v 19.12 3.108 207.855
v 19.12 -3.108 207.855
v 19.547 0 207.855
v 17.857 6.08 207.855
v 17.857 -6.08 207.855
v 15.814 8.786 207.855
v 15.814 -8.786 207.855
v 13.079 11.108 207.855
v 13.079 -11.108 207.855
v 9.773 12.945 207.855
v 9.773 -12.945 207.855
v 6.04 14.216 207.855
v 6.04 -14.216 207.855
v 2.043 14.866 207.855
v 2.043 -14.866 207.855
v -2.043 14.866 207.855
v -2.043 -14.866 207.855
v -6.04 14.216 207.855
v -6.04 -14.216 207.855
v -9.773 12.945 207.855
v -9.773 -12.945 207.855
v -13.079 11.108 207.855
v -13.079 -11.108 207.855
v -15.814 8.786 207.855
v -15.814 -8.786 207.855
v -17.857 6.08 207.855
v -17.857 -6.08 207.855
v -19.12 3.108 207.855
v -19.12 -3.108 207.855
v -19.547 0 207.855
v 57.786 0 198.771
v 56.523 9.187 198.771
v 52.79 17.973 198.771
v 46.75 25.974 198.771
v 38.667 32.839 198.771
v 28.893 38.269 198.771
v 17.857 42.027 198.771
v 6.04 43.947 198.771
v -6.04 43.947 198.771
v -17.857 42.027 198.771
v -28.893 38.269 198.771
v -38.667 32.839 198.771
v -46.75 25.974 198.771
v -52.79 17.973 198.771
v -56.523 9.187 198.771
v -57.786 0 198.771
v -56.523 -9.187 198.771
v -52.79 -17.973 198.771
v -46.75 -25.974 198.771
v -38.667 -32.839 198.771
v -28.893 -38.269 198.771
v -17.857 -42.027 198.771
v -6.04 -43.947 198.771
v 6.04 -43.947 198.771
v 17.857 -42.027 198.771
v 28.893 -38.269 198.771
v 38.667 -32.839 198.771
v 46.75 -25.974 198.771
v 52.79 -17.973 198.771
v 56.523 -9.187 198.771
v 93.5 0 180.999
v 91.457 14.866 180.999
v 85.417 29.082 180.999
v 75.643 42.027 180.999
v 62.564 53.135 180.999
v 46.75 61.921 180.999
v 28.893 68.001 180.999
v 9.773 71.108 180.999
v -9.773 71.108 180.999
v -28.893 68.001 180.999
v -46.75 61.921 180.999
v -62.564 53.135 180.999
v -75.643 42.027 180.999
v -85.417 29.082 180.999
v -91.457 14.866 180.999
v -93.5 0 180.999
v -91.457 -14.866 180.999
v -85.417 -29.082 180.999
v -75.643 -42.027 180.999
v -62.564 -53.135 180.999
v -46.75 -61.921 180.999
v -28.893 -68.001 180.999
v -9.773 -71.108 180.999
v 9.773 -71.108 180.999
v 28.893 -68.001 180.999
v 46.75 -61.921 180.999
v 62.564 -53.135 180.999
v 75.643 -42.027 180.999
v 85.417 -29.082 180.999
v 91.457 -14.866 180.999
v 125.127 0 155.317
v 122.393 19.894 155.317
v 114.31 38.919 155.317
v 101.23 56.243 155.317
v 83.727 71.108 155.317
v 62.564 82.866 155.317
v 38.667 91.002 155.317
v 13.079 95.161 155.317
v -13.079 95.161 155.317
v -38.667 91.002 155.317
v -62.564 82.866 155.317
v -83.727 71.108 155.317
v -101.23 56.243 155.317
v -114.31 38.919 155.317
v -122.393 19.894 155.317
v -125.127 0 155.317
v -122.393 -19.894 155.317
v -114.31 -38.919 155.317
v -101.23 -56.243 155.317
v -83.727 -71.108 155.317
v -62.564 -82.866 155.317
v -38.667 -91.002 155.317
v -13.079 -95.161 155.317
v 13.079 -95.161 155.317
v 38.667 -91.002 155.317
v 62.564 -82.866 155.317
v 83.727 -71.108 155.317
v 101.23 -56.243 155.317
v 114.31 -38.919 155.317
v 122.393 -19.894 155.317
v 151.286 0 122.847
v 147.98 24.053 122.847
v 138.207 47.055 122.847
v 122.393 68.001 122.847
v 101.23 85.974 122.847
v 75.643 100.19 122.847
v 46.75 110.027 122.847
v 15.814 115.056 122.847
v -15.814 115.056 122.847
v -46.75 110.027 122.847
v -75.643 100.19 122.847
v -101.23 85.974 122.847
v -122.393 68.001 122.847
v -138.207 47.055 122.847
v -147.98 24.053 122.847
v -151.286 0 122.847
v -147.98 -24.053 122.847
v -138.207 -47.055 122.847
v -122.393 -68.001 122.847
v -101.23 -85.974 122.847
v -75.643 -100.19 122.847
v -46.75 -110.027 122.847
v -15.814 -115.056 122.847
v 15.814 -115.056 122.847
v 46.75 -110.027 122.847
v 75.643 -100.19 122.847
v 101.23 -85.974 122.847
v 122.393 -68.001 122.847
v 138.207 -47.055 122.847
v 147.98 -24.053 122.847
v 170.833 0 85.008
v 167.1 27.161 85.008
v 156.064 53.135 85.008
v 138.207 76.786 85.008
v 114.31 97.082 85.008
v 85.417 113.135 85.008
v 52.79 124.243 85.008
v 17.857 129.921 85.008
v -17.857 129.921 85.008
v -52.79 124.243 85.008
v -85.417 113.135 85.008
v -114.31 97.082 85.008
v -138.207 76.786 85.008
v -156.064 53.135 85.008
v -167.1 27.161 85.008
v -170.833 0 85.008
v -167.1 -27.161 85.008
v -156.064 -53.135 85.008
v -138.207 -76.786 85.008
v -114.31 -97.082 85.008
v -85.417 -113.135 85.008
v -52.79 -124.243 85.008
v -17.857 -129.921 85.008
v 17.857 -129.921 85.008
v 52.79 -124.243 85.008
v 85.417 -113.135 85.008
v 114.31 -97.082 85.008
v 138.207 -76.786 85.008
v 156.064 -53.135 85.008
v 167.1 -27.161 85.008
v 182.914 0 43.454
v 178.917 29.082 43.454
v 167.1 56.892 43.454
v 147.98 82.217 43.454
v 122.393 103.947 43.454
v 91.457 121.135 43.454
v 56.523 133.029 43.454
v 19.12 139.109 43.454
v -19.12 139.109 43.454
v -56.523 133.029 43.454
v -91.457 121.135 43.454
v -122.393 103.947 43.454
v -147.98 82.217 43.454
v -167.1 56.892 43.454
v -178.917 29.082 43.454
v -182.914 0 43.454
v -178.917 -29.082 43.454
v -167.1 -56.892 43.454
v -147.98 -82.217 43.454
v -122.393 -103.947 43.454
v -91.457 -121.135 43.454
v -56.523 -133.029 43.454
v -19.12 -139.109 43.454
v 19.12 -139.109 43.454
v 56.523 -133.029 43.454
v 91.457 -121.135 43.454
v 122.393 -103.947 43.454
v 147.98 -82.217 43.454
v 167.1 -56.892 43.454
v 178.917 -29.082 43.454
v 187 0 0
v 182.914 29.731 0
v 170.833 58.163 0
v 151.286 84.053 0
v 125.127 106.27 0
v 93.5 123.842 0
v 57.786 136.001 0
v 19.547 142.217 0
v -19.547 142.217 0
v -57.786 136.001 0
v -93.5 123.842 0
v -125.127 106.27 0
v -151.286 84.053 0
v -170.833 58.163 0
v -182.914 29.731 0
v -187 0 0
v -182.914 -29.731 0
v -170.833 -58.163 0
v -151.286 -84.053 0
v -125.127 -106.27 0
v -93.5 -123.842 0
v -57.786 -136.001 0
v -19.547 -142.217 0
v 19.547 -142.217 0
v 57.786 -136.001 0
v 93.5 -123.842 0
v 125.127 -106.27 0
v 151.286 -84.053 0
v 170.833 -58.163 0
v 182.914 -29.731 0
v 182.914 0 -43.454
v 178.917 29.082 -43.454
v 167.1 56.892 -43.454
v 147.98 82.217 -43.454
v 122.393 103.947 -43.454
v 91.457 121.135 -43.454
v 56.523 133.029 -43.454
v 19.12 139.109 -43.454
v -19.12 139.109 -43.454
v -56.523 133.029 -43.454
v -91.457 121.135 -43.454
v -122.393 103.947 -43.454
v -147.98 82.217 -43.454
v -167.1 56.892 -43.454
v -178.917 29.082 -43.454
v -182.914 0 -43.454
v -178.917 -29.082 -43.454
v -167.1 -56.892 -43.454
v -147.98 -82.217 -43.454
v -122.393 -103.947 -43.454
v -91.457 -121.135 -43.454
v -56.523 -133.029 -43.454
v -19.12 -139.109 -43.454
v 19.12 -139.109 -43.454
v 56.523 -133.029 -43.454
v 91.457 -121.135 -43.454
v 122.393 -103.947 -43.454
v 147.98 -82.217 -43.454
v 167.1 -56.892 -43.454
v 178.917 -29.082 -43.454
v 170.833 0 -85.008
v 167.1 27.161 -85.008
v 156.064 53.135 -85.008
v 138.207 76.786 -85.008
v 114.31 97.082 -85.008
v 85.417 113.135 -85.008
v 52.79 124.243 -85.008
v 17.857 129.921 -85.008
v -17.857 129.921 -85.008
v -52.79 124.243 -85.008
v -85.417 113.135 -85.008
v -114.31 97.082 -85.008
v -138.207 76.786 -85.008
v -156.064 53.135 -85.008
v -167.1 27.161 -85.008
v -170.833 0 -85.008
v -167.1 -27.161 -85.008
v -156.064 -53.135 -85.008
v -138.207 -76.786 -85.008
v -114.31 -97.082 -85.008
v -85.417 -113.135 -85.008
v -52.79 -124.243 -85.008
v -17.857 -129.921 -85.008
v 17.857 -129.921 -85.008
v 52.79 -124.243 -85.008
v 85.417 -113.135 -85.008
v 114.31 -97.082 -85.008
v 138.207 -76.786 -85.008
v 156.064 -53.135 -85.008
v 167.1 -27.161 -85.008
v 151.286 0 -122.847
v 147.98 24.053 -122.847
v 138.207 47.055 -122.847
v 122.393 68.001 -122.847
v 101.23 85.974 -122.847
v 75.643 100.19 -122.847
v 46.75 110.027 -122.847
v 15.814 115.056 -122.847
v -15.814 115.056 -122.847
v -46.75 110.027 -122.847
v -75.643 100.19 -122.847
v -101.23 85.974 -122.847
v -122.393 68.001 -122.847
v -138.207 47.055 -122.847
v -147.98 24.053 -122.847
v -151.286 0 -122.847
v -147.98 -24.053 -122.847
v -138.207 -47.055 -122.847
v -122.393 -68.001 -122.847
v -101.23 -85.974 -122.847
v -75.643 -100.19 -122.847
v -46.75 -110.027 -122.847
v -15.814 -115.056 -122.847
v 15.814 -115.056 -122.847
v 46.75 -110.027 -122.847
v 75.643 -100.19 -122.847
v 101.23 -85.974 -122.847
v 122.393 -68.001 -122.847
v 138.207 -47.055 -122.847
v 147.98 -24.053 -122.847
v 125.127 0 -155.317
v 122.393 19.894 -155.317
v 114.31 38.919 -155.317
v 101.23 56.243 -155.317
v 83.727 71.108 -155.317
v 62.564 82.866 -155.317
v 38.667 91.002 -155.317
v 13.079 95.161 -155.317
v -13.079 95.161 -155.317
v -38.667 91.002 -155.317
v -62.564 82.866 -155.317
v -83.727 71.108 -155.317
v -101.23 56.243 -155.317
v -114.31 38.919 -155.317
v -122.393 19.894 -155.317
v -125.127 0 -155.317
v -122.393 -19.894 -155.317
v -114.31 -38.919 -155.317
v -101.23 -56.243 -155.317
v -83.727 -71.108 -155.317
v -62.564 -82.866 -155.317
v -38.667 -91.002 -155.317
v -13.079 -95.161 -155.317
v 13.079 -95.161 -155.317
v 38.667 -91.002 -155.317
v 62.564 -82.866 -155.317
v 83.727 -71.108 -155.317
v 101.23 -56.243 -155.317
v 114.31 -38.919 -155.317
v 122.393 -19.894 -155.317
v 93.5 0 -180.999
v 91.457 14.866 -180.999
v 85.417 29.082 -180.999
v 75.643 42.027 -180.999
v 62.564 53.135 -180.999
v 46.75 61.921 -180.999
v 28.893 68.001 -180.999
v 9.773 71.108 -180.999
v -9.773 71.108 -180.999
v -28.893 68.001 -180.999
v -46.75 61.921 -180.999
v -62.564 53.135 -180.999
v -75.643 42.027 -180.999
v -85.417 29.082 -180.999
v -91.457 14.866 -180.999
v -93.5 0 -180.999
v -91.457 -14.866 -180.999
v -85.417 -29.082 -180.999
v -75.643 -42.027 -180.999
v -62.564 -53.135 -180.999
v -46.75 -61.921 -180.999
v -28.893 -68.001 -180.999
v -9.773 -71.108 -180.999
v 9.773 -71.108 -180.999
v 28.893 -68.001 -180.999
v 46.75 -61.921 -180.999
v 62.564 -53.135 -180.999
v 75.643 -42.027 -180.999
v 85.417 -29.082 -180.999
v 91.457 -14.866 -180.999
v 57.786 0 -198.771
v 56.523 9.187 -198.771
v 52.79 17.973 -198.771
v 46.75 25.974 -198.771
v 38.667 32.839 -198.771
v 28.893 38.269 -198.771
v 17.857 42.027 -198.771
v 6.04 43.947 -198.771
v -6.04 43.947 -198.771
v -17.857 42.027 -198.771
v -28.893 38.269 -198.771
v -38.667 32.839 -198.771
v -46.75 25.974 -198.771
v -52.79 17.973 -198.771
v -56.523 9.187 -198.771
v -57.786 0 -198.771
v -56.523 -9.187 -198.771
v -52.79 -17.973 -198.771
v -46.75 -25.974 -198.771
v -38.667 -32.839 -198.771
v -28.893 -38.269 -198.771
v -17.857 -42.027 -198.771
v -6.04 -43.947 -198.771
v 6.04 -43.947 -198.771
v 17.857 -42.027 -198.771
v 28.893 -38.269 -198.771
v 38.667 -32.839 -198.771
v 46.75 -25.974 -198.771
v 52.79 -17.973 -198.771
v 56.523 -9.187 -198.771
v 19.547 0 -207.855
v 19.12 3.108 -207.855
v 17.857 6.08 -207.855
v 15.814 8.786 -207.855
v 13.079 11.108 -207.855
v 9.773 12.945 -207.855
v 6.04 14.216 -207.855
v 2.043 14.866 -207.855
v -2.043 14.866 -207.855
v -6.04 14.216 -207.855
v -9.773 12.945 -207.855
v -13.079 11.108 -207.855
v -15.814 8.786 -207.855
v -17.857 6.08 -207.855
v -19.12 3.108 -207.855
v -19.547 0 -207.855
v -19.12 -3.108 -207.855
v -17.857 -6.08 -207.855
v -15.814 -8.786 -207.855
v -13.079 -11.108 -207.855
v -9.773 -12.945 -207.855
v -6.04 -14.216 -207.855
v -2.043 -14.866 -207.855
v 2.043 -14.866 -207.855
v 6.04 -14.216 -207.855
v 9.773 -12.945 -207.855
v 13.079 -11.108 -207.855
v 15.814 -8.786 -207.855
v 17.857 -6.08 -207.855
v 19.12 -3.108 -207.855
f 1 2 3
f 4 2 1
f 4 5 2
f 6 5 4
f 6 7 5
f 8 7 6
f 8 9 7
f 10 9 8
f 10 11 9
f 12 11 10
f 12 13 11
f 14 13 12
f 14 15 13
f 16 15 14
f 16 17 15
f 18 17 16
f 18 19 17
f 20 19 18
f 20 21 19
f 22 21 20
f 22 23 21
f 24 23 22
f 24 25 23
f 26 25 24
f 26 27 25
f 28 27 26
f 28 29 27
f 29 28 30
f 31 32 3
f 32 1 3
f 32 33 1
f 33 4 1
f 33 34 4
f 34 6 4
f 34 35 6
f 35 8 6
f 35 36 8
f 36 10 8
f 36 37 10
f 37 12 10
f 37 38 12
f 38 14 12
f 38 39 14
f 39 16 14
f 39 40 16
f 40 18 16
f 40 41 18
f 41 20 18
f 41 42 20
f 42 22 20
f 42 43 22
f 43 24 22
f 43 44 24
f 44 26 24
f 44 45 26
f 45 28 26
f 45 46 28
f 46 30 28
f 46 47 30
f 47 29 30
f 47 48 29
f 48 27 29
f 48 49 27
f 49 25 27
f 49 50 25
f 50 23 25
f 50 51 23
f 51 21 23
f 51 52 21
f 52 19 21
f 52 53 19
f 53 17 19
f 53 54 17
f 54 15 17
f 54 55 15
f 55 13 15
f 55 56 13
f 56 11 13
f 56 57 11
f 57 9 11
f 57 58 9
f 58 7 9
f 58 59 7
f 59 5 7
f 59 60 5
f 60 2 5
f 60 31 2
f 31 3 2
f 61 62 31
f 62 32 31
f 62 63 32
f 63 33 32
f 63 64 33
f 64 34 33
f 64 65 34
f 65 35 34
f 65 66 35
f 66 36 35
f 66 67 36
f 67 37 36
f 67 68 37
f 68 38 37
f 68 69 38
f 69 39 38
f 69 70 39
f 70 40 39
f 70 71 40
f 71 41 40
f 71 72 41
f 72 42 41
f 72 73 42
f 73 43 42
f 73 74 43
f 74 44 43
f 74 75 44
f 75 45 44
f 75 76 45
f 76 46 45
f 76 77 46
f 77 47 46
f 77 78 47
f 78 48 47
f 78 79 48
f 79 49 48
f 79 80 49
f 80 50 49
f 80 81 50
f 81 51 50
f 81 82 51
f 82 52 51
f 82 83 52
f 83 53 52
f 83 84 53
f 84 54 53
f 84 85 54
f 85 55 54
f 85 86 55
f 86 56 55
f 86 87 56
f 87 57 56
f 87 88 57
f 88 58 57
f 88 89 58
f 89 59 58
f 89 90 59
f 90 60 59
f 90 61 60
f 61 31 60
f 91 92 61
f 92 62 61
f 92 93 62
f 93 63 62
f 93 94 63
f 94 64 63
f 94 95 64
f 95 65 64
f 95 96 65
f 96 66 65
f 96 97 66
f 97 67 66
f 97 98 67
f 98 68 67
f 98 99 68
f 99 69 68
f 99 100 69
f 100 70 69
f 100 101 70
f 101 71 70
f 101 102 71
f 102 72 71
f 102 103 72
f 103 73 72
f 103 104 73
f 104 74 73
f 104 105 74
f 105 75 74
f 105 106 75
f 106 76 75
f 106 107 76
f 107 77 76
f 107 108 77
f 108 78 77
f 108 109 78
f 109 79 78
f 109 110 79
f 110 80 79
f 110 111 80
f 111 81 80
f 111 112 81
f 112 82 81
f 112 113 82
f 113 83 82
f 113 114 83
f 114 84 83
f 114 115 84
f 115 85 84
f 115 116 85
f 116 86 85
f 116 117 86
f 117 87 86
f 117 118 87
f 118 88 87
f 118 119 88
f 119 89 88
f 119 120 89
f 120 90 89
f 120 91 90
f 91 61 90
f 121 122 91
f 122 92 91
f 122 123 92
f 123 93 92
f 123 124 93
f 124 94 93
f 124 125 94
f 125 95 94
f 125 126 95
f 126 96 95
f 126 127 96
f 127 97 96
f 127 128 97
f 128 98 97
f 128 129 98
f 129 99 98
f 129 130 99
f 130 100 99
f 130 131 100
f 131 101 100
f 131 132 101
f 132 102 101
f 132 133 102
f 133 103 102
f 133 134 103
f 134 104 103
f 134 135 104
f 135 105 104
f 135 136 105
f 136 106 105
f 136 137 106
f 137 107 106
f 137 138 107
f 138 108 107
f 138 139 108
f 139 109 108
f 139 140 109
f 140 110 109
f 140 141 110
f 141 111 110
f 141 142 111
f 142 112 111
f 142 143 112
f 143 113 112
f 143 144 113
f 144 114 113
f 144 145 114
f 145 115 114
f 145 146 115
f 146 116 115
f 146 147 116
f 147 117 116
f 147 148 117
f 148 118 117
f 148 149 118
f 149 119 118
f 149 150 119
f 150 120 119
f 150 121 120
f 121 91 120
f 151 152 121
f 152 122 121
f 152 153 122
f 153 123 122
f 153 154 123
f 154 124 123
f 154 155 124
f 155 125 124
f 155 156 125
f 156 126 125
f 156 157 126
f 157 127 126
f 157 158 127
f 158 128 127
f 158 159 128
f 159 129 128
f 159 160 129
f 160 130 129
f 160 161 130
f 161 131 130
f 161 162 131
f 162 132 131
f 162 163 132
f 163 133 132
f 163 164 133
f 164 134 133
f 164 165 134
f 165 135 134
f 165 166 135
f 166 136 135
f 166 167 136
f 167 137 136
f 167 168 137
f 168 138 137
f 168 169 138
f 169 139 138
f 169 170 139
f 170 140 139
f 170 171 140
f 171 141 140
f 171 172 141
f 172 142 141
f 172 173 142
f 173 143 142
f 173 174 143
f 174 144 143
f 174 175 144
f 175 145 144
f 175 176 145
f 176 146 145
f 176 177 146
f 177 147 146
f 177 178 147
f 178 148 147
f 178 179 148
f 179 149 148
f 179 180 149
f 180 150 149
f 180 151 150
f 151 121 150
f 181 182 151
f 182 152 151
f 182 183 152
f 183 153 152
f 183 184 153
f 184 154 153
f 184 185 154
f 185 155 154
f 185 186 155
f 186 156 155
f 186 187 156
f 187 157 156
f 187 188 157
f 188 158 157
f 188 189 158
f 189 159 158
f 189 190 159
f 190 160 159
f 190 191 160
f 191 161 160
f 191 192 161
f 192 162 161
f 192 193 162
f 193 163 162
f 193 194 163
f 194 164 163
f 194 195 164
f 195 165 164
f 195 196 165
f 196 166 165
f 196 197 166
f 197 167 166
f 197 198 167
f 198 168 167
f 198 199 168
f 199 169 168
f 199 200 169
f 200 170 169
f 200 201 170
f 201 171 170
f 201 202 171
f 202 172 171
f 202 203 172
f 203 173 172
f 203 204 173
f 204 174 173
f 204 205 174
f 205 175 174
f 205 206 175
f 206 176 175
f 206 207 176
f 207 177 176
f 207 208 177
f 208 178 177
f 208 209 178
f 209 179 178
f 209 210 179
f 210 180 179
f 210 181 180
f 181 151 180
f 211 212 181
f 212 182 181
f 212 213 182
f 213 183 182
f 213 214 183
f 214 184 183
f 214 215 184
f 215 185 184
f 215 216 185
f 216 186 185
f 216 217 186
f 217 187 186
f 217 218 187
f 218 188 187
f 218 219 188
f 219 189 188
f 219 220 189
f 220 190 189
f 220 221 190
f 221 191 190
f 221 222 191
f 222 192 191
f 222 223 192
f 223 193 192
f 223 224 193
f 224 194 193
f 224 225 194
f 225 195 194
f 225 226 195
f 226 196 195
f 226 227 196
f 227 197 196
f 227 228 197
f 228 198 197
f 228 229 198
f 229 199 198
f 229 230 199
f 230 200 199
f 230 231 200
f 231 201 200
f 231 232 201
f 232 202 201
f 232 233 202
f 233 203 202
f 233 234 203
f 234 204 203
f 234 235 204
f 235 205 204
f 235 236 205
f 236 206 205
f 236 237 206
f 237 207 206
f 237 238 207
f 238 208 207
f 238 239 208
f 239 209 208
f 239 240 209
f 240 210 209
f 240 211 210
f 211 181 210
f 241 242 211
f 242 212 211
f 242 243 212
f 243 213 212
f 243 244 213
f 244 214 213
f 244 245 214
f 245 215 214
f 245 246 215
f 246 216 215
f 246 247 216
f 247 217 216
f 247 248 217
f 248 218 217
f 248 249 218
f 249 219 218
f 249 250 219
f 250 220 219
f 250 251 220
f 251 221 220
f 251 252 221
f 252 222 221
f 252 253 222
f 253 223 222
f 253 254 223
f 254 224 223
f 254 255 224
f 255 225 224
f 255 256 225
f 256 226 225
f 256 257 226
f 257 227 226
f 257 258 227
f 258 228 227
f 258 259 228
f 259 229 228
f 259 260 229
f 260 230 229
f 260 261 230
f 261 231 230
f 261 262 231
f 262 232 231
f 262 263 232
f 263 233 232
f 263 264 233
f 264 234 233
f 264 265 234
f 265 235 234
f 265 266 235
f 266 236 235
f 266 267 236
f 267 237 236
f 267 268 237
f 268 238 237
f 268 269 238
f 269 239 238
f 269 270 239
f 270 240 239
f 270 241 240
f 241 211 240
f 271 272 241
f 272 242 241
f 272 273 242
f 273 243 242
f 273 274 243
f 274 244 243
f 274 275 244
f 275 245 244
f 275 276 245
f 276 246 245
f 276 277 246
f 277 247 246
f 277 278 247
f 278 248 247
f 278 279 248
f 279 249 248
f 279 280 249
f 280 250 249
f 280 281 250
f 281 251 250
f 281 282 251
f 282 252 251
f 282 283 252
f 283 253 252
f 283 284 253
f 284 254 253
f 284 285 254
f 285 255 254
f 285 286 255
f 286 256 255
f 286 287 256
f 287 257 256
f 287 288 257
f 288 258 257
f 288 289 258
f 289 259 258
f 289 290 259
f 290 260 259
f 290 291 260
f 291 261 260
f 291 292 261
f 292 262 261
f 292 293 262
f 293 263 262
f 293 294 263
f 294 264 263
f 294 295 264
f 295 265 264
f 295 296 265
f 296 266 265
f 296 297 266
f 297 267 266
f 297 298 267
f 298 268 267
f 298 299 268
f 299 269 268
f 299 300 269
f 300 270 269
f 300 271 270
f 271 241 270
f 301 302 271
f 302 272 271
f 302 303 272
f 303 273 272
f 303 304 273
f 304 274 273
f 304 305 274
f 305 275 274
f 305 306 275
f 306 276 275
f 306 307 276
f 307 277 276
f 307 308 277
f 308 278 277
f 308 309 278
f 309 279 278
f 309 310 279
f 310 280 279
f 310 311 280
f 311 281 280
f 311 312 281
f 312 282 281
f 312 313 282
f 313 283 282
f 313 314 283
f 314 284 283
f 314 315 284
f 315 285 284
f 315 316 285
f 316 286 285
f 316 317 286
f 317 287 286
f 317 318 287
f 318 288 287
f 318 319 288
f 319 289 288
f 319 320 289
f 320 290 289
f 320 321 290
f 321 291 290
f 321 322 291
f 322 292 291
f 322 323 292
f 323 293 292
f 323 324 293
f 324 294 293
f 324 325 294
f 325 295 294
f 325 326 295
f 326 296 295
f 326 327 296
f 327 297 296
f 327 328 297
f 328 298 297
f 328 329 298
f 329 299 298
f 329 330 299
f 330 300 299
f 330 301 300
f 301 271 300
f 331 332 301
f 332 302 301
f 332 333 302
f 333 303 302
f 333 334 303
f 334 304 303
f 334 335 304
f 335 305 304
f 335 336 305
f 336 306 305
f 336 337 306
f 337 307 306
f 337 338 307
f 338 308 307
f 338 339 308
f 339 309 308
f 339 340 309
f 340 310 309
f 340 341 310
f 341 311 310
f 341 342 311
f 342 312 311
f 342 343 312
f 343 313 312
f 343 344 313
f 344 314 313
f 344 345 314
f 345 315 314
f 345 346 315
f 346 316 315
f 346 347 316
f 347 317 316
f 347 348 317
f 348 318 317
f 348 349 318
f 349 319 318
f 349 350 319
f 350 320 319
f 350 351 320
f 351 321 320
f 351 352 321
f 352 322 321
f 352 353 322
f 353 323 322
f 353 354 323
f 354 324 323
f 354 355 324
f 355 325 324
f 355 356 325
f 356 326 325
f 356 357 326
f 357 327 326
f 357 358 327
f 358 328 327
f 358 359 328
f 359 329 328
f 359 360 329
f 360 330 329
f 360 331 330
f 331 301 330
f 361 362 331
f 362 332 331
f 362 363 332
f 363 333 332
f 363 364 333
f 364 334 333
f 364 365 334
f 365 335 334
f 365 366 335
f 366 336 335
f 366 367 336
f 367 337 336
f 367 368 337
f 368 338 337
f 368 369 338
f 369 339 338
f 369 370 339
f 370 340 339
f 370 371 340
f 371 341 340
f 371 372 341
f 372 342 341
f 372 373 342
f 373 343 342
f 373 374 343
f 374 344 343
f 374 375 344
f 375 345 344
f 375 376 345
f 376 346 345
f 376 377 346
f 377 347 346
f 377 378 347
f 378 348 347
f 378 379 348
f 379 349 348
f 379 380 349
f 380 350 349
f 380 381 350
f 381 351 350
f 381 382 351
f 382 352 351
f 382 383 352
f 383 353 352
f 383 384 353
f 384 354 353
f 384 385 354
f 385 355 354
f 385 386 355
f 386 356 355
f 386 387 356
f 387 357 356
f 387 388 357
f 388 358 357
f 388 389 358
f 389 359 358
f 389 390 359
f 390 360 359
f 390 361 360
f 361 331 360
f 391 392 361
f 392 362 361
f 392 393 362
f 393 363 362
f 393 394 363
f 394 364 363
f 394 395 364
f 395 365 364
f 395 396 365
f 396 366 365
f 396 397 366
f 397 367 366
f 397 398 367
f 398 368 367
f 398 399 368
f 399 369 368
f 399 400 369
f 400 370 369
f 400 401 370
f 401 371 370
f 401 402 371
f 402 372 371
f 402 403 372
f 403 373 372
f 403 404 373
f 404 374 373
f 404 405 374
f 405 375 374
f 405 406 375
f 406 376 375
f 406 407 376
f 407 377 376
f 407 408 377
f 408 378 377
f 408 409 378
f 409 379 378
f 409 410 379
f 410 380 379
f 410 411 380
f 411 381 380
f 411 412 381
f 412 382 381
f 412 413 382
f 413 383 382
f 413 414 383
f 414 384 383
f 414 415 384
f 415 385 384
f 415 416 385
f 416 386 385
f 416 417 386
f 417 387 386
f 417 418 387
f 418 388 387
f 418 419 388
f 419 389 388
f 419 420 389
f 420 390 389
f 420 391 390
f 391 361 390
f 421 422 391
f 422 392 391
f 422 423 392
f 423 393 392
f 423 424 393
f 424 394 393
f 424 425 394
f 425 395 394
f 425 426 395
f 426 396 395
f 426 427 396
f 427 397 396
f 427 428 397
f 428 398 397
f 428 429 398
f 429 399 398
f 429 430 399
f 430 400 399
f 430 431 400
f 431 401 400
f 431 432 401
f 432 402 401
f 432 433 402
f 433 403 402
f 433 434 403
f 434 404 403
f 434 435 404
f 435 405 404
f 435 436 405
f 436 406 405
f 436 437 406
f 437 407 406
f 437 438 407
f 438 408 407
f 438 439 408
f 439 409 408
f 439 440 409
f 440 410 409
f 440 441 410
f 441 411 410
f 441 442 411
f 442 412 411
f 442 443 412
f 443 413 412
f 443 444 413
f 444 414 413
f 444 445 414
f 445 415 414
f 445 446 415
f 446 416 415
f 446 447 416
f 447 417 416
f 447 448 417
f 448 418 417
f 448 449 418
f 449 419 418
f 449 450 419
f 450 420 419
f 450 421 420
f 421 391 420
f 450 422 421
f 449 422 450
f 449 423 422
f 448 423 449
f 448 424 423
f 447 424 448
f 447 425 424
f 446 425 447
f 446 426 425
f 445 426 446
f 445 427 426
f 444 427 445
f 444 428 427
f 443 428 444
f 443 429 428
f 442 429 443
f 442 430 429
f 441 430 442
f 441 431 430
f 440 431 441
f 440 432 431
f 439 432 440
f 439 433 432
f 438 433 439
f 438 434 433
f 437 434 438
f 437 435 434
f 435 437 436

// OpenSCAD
// Generated by SolidPython 1.0.1 on 2020-07-29 00:46:53


scale(v = [17, 13, 19]) {
	sphere(r = 11);
}
/***********************************************
*********      SolidPython code:      **********
************************************************
 
# import packages: SolidPython
from solid import *
from solid.utils import *
from itertools import chain, combinations, permutations


class Resize:

    def __init__(self, scad_file):
        self.scad_file = scad_file
        #self.scad_file = import_scad(scad_file)
        # cone/cylinder param:
        self.r1 = 0
        self.r2 = 0
        self.h = 0
        # rectangular prism param:
        self.w = 0
        self.l = 0
        # ellipse param:
        self.r = 0

    # import OpenScad code (file name corresponds to shape)


    # classify shape + parameters
    def assign(self, param1, param2, param3):
        if self.scad_file == 'cone.scad':
            self.r1 = param1
            self.r2 = param2
            self.h = param3
        elif self.scad_file == 'cylinder.scad':
            self.r1 = param1
            self.r2 = param2
            self.h = param3
        elif self.scad_file == 'rectangularPrism.scad':
            self.h = param1
            self.l = param2
            self.w = param3
        else:
            self.r = param1
            self.h = param2

    # resize parameters
    def iterate(self):
        x = range(3, 20, 2)
        i = 1
        if self.scad_file == 'cone.scad':
            tempList = list(permutations(x, 2))
            for temp in tempList:
                param1 = temp[0]
                param2 = temp[1]
                filepath = 'produced_scad_files/' + 'cone' + str(param1) + '_' + str(param2) + '_' + '.scad'
                scad_render_to_file(cylinder(h=param1, r1=param2, r2=0), filepath)

        elif self.scad_file == 'cylinder.scad':
            tempList = list(permutations(x, 3))
            for temp in tempList:
                param1 = temp[0]
                param2 = temp[1]
                filepath = 'produced_scad_files/' + 'cylinder' + str(param1) + '_' + str(param2) + '_' + '.scad'
                scad_render_to_file(cylinder(h=param1, r1=param2, r2=param2), filepath)

        elif self.scad_file == 'rectangularPrism.scad':
            tempList = list(permutations(x, 3))
            for temp in tempList:
                param1 = temp[0]
                param2 = temp[1]
                param3 = temp[2]
                filepath = 'produced_scad_files/' + 'rectangularPrism' + str(param1) + '_' + str(param2) + '_' + str(
                    param3) + '.scad'
                scad_render_to_file(cube(size=(param1, param2, param3)), filepath)

        elif self.scad_file == 'ellipse.scad':
            tempList = list(permutations(x, 4))
            for temp in tempList:
                param1 = temp[0]
                param2 = temp[1]
                param3 = temp[2]
                param4 = temp[3]
                filepath = 'produced_scad_files/' + 'ellipse' + str(param1) + '_' + str(param2) + '_' + str(param3) + '_' + str(param4) + '.scad'
                scad_render_to_file(scale([param1, param2, param3])(sphere(r=param4)), filepath)

    def render_to_scadfile(self):
        scad_render_to_file(scad, 'example.scad') 
 
************************************************/
